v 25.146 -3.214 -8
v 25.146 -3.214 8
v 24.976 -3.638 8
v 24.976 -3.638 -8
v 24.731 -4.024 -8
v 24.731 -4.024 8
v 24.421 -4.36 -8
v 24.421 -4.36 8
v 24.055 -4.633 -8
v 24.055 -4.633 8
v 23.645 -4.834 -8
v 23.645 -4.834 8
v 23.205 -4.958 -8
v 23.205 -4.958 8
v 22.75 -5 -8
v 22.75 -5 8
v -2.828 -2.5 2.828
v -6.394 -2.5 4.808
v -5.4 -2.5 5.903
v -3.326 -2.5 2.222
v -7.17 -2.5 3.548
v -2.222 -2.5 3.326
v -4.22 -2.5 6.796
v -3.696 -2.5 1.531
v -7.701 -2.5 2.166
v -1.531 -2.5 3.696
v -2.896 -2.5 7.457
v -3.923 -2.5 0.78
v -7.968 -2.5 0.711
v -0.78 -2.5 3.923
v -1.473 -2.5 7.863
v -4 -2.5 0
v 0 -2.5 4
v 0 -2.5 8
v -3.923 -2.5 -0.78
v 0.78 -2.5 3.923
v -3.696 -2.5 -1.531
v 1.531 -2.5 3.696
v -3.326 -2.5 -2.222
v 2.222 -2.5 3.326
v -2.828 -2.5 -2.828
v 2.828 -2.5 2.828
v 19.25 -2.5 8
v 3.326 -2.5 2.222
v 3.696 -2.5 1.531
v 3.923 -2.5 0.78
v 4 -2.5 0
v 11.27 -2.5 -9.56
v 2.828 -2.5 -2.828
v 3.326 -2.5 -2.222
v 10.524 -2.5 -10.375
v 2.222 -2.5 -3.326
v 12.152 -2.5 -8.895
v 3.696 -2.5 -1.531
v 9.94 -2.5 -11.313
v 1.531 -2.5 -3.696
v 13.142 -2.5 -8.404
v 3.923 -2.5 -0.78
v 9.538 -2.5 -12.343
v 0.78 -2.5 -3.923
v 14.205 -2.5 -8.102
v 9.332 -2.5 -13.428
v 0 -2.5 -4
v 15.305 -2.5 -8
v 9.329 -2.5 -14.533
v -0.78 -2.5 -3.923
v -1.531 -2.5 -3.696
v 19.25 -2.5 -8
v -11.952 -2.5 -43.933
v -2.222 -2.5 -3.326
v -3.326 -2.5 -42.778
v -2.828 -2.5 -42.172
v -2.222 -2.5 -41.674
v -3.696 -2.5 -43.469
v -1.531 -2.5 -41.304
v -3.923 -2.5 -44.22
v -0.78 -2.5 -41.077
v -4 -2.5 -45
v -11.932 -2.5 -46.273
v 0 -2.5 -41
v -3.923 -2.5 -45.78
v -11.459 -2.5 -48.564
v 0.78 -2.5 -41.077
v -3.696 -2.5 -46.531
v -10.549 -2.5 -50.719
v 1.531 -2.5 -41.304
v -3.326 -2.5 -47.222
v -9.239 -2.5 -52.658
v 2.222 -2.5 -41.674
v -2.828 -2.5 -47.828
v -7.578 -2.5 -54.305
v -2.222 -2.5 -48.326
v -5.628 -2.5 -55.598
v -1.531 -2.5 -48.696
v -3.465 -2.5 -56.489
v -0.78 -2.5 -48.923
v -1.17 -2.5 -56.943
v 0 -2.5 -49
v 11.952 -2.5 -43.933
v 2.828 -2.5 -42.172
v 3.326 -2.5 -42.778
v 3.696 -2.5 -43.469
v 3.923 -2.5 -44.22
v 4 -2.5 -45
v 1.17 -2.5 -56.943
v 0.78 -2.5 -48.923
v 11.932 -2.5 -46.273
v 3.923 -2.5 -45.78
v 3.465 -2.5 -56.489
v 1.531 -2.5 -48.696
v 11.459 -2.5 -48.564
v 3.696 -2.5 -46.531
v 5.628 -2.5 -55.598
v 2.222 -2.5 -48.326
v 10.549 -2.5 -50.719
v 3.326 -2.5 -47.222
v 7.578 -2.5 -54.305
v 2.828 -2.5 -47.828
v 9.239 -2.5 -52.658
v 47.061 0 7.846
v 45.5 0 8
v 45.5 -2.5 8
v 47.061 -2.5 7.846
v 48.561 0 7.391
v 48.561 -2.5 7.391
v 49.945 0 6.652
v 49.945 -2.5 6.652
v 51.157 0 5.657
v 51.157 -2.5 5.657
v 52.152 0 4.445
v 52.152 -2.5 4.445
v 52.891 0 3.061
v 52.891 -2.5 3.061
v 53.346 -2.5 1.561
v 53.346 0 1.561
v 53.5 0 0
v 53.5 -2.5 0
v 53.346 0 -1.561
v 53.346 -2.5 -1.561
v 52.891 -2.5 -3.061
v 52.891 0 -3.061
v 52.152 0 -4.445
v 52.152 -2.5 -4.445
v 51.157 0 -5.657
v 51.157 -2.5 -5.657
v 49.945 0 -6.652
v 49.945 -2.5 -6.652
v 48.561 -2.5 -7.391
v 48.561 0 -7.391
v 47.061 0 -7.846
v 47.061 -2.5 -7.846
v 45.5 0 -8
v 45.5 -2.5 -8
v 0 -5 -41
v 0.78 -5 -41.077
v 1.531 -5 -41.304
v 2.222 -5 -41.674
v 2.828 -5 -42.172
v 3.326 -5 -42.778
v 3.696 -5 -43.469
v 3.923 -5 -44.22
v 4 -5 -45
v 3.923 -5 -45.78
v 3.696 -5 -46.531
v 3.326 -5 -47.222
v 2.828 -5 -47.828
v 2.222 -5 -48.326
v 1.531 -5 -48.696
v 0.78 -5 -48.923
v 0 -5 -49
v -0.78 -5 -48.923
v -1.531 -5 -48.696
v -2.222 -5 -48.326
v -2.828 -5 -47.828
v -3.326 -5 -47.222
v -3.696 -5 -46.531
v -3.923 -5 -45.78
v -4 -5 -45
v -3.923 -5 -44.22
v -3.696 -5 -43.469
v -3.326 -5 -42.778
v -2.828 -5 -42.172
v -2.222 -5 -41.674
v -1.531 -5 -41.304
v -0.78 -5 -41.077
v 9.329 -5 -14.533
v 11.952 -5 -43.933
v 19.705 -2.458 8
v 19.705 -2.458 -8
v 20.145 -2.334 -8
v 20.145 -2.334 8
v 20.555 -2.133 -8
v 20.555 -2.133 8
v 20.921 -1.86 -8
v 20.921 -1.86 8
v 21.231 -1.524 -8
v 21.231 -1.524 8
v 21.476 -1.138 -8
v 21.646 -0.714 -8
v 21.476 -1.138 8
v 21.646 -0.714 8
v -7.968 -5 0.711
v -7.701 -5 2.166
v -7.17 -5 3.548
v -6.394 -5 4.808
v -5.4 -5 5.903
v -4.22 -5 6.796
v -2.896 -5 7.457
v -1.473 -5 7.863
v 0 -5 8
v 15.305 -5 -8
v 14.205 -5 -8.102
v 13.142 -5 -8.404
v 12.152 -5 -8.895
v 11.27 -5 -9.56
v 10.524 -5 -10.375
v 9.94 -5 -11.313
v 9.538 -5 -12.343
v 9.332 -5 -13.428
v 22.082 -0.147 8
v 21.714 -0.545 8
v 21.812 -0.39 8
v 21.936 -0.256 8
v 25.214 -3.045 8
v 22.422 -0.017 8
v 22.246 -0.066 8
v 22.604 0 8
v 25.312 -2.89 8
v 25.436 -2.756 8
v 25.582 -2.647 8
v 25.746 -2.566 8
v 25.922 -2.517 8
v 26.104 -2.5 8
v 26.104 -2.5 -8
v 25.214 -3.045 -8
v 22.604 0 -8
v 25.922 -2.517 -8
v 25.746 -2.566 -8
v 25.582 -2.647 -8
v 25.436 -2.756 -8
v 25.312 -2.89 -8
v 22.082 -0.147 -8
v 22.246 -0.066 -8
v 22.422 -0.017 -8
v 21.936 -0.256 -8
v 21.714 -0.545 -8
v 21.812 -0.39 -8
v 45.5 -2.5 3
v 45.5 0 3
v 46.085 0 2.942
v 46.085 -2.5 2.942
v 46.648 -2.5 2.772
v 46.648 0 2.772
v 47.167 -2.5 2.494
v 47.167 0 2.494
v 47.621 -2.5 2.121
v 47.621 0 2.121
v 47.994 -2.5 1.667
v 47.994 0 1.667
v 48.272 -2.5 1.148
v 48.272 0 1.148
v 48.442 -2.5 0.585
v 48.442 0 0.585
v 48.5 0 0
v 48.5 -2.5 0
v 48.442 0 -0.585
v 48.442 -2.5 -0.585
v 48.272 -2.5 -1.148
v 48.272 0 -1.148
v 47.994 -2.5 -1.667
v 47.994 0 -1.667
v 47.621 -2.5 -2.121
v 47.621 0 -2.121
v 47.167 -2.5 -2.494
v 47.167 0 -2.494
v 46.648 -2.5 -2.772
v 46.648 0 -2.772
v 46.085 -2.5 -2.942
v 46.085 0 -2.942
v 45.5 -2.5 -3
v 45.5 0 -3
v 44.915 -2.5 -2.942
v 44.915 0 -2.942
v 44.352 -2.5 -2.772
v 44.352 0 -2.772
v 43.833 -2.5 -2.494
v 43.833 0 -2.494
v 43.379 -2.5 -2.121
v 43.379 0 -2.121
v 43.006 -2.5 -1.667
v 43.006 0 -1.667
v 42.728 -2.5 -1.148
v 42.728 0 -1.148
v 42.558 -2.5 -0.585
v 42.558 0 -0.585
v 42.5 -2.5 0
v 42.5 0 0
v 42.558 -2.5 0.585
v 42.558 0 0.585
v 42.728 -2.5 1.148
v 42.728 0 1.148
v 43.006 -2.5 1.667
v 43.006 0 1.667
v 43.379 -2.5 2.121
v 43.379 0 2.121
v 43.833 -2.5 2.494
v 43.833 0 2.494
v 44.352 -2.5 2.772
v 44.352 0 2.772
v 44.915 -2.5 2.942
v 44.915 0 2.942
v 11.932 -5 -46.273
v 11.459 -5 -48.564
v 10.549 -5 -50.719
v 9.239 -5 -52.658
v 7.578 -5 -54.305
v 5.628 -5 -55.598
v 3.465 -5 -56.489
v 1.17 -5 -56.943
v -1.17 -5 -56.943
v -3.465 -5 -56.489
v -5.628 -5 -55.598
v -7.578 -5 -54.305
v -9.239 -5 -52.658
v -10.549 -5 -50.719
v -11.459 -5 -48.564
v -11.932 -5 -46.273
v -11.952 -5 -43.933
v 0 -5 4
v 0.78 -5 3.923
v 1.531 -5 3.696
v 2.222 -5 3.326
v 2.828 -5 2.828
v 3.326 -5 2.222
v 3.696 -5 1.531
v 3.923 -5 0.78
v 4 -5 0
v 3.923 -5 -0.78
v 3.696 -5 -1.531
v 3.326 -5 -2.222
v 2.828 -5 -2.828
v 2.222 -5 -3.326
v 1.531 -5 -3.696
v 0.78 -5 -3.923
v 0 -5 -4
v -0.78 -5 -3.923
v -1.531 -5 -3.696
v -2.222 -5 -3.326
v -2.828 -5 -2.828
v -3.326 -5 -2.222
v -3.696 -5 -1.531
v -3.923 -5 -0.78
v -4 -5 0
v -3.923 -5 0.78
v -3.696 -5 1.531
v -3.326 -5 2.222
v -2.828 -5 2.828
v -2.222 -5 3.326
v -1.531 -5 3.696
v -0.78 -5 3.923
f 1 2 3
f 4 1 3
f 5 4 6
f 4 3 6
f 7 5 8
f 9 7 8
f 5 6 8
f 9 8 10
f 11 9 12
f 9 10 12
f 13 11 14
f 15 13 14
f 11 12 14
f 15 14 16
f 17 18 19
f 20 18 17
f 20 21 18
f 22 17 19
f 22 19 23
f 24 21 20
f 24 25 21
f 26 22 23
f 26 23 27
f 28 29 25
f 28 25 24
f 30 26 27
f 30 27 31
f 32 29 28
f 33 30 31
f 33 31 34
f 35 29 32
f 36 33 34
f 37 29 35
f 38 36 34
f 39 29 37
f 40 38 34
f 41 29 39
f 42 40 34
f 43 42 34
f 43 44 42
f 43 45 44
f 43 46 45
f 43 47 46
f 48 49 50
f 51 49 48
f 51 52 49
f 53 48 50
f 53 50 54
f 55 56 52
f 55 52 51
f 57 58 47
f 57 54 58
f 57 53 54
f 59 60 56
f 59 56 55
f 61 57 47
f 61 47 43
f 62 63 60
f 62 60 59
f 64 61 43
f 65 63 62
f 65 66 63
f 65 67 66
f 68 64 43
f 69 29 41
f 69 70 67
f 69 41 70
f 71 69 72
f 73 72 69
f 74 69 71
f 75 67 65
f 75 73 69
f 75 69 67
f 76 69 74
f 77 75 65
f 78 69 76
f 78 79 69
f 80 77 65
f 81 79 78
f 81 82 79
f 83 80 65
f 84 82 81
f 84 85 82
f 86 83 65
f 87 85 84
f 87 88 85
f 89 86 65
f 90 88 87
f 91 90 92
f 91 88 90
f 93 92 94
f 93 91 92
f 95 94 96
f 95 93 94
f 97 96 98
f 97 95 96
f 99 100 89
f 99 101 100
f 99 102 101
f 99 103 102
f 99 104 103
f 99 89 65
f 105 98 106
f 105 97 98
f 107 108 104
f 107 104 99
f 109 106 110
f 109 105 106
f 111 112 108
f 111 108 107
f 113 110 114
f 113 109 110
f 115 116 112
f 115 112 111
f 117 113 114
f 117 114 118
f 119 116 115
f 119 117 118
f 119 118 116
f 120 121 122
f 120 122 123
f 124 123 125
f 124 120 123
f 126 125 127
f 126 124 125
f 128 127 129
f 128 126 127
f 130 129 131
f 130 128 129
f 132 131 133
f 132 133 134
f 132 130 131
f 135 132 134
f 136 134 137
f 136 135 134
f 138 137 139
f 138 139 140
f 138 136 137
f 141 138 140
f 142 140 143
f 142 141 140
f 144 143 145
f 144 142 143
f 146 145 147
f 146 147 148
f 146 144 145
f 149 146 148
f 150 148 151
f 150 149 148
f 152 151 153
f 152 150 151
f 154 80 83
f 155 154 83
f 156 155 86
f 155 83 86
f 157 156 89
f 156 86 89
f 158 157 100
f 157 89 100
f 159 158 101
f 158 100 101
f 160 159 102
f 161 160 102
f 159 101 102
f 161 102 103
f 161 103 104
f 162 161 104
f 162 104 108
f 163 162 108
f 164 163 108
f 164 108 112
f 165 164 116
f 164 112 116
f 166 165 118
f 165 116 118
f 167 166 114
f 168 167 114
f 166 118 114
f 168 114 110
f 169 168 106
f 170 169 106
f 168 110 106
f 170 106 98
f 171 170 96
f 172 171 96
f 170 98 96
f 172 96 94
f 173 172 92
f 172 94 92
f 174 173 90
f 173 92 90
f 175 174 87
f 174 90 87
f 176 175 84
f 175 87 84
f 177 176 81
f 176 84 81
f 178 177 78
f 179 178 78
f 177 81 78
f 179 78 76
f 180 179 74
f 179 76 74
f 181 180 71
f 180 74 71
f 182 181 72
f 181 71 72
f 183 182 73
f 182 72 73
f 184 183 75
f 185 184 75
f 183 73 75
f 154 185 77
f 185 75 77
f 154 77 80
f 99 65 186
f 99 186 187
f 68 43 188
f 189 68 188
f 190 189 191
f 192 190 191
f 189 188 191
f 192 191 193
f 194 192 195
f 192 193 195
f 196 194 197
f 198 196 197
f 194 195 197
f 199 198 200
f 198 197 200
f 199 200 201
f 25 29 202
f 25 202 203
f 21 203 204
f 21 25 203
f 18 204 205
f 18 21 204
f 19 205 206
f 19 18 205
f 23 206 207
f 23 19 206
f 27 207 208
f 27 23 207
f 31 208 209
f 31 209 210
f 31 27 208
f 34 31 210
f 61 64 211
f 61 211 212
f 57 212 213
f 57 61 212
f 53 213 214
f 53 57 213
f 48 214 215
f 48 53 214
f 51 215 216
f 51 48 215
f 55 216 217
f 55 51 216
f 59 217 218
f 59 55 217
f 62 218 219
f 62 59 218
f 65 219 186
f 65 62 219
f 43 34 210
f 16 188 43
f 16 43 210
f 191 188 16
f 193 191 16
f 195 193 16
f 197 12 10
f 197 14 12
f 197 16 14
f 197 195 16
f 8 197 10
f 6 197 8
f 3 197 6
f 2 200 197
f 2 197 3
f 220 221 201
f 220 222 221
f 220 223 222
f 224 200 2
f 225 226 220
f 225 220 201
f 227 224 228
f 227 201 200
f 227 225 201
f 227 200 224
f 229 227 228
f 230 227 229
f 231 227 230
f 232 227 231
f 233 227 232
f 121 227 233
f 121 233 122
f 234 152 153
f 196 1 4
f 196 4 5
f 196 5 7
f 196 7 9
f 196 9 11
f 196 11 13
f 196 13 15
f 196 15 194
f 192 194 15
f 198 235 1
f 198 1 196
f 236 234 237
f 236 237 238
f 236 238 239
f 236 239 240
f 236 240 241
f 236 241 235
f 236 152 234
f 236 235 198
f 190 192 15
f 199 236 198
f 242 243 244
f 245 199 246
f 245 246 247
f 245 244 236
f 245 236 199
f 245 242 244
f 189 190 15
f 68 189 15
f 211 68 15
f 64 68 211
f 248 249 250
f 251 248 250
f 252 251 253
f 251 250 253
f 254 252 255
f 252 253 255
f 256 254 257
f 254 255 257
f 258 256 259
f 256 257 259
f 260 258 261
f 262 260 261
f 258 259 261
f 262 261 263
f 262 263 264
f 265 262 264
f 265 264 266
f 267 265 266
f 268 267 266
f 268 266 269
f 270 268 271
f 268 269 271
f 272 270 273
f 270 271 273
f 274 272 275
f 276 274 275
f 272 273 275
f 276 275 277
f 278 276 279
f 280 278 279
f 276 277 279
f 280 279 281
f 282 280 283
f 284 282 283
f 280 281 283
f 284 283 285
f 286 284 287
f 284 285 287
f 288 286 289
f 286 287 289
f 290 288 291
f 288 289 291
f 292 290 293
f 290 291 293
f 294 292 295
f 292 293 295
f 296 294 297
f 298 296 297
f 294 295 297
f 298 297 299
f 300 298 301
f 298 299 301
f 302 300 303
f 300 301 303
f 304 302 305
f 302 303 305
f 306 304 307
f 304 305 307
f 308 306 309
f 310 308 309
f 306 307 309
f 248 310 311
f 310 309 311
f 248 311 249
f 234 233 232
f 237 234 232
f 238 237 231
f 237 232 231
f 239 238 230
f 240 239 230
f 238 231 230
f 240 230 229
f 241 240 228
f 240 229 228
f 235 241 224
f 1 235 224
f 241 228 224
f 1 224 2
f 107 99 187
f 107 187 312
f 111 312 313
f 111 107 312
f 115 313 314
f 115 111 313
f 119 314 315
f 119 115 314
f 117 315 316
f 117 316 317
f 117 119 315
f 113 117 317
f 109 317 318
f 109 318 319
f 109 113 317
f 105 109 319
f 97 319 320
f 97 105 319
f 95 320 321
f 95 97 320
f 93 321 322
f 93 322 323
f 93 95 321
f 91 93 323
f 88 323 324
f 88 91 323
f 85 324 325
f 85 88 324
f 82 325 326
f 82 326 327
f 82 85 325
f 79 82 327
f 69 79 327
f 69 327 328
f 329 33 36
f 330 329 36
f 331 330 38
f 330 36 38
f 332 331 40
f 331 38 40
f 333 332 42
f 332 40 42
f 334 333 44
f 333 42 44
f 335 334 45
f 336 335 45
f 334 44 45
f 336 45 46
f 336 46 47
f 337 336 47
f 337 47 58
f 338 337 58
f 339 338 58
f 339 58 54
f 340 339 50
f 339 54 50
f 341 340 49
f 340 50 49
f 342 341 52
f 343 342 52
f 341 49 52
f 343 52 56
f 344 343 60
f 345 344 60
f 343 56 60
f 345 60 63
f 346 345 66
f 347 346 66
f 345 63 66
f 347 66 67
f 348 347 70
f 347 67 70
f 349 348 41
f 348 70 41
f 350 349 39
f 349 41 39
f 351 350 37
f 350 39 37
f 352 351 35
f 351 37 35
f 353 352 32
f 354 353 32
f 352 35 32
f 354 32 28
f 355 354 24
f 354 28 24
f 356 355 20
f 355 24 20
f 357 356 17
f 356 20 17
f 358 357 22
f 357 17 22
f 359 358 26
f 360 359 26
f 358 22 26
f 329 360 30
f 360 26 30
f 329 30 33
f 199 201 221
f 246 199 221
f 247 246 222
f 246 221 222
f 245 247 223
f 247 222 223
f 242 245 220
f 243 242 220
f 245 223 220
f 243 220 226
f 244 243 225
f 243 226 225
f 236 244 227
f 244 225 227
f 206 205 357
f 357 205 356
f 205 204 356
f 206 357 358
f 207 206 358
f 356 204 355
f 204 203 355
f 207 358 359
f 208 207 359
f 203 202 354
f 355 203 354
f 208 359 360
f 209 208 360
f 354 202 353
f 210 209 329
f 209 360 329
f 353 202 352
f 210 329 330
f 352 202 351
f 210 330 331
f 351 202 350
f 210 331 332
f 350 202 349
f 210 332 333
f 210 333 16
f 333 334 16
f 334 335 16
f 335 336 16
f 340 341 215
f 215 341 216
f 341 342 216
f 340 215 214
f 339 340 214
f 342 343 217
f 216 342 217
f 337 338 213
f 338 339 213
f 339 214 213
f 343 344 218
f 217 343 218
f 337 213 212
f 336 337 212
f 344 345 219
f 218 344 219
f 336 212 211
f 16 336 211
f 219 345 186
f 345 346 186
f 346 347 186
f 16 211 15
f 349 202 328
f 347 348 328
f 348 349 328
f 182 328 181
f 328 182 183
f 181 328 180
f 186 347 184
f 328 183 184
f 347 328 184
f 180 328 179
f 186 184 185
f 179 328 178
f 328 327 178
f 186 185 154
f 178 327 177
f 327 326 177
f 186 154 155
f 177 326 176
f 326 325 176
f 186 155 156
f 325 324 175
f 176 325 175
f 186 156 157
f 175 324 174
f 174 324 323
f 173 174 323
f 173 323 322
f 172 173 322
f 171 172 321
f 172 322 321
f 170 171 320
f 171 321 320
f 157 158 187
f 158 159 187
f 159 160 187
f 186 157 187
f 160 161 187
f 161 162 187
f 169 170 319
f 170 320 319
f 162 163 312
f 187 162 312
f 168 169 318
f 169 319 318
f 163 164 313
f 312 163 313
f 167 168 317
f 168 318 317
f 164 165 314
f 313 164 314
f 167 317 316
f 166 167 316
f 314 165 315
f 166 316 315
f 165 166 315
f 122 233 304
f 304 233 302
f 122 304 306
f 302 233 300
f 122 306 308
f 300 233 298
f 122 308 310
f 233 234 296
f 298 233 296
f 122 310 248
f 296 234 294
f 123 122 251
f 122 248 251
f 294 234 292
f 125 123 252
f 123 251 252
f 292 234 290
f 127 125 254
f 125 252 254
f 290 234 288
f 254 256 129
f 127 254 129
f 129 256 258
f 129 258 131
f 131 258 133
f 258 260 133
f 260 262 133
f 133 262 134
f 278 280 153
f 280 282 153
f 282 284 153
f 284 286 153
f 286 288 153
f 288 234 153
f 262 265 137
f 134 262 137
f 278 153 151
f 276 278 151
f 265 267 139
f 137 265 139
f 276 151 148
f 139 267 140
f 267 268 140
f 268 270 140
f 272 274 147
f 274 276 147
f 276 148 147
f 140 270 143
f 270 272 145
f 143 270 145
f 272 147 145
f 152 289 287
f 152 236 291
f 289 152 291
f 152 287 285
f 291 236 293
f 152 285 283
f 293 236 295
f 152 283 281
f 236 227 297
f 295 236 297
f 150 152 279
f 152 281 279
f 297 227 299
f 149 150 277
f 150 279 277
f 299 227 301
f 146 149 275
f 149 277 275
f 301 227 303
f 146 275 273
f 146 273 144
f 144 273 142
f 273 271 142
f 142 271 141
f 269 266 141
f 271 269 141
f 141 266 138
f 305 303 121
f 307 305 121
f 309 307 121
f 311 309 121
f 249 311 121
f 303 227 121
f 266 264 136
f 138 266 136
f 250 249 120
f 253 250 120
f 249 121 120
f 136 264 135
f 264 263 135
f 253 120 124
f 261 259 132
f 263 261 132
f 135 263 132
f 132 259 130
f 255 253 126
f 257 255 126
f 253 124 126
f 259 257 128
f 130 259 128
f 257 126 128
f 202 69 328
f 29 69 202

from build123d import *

# Parameters (mm, degrees)
SKETCH1_R           = 3
BOSS_EXTRUDE1_DEPTH = 2.5
BOSS_EXTRUDE2_START = 2.5
SKETCH1_3_R         = 4
BOSS_EXTRUDE2_DEPTH = 2.5
BOSS_EXTRUDE3_DEPTH = 16


with BuildPart() as part:
    # Sketch1 → Boss-Extrude1 (new body)
    with BuildSketch(Plane(origin=(0, 0, 0), x_dir=(1, 0, 0), z_dir=(0, 1, 0))):
        with BuildLine():
            Line((22.75, -8), (45.5, -8))
            ThreePointArc((45.5, -8), (53.5, 0), (45.5, 8))
            Line((45.5, 8), (22.75, 8))
            Line((22.75, 8), (22.75, -8))
        make_face()
        with Locations(Location((45.5, 0, 0), (0, 0, 270))):
            Circle(SKETCH1_R, mode=Mode.SUBTRACT)
    extrude(amount=BOSS_EXTRUDE1_DEPTH)



with BuildPart() as body_2:
    # Sketch1<3> → Boss-Extrude2 (new body)
    with BuildSketch(Plane(origin=(0, 0, 0), x_dir=(1, 0, 0), z_dir=(0, 1, 0)).offset(BOSS_EXTRUDE2_START)):
        with BuildLine():
            Line((0, -8), (22.75, -8))
            Line((22.75, -8), (22.75, 8))
            Line((22.75, 8), (15.305028665, 8))
            ThreePointArc((15.305028665, 8), (10.877839941, 9.950308654), (9.328779377, 14.533333333))
            Line((9.328779377, 14.533333333), (11.952427887, 43.93254122))
            Line((11.952427887, 43.93254122), (11.952498577, 43.933333333))
            ThreePointArc((11.952498577, 43.933333333), (0, 57), (-11.952498577, 43.933333333))
            Line((-11.952498577, 43.933333333), (-7.968332384, -0.711111111))
            ThreePointArc((-7.968332384, -0.711111111), (-5.399588462, -5.902918299), (0, -8))
        make_face()
        with Locations(Location((0, 0, 0), (0, 0, 270))):
            Circle(SKETCH1_3_R, mode=Mode.SUBTRACT)
        with Locations(Location((0, 45, 0), (0, 0, 270))):
            Circle(SKETCH1_3_R, mode=Mode.SUBTRACT)
    extrude(amount=BOSS_EXTRUDE2_DEPTH)


with BuildPart() as part_1:
    add(part.part)

    add(body_2.part)  # Boss-Extrude3 merges body 2
    # Sketch2 → Boss-Extrude3 (add)
    with BuildSketch(Plane.XY.offset(8)):
        with BuildLine():
            Line((22.75, 5), (19.25, 5))
            Line((19.25, 5), (19.25, 2.5))
            ThreePointArc((19.25, 2.5), (20.744035762, 2.004459314), (21.645787119, 0.714285714))
            ThreePointArc((21.645787119, 0.714285714), (22.006487662, 0.198216274), (22.604101966, 0))
            Line((22.604101966, 0), (22.75, 0))
            Line((22.75, 0), (22.75, 2.5))
            Line((22.75, 2.5), (26.104101966, 2.5))
            ThreePointArc((26.104101966, 2.5), (25.506487662, 2.698216274), (25.145787119, 3.214285714))
            ThreePointArc((25.145787119, 3.214285714), (24.244035762, 4.504459314), (22.75, 5))
        make_face()
    extrude(amount=-BOSS_EXTRUDE3_DEPTH)


with BuildPart() as body_2_2:
    # Mirror4: mirrored copy
    add(part_1.part.mirror(Plane.ZX))


solid = body_2_2.part
